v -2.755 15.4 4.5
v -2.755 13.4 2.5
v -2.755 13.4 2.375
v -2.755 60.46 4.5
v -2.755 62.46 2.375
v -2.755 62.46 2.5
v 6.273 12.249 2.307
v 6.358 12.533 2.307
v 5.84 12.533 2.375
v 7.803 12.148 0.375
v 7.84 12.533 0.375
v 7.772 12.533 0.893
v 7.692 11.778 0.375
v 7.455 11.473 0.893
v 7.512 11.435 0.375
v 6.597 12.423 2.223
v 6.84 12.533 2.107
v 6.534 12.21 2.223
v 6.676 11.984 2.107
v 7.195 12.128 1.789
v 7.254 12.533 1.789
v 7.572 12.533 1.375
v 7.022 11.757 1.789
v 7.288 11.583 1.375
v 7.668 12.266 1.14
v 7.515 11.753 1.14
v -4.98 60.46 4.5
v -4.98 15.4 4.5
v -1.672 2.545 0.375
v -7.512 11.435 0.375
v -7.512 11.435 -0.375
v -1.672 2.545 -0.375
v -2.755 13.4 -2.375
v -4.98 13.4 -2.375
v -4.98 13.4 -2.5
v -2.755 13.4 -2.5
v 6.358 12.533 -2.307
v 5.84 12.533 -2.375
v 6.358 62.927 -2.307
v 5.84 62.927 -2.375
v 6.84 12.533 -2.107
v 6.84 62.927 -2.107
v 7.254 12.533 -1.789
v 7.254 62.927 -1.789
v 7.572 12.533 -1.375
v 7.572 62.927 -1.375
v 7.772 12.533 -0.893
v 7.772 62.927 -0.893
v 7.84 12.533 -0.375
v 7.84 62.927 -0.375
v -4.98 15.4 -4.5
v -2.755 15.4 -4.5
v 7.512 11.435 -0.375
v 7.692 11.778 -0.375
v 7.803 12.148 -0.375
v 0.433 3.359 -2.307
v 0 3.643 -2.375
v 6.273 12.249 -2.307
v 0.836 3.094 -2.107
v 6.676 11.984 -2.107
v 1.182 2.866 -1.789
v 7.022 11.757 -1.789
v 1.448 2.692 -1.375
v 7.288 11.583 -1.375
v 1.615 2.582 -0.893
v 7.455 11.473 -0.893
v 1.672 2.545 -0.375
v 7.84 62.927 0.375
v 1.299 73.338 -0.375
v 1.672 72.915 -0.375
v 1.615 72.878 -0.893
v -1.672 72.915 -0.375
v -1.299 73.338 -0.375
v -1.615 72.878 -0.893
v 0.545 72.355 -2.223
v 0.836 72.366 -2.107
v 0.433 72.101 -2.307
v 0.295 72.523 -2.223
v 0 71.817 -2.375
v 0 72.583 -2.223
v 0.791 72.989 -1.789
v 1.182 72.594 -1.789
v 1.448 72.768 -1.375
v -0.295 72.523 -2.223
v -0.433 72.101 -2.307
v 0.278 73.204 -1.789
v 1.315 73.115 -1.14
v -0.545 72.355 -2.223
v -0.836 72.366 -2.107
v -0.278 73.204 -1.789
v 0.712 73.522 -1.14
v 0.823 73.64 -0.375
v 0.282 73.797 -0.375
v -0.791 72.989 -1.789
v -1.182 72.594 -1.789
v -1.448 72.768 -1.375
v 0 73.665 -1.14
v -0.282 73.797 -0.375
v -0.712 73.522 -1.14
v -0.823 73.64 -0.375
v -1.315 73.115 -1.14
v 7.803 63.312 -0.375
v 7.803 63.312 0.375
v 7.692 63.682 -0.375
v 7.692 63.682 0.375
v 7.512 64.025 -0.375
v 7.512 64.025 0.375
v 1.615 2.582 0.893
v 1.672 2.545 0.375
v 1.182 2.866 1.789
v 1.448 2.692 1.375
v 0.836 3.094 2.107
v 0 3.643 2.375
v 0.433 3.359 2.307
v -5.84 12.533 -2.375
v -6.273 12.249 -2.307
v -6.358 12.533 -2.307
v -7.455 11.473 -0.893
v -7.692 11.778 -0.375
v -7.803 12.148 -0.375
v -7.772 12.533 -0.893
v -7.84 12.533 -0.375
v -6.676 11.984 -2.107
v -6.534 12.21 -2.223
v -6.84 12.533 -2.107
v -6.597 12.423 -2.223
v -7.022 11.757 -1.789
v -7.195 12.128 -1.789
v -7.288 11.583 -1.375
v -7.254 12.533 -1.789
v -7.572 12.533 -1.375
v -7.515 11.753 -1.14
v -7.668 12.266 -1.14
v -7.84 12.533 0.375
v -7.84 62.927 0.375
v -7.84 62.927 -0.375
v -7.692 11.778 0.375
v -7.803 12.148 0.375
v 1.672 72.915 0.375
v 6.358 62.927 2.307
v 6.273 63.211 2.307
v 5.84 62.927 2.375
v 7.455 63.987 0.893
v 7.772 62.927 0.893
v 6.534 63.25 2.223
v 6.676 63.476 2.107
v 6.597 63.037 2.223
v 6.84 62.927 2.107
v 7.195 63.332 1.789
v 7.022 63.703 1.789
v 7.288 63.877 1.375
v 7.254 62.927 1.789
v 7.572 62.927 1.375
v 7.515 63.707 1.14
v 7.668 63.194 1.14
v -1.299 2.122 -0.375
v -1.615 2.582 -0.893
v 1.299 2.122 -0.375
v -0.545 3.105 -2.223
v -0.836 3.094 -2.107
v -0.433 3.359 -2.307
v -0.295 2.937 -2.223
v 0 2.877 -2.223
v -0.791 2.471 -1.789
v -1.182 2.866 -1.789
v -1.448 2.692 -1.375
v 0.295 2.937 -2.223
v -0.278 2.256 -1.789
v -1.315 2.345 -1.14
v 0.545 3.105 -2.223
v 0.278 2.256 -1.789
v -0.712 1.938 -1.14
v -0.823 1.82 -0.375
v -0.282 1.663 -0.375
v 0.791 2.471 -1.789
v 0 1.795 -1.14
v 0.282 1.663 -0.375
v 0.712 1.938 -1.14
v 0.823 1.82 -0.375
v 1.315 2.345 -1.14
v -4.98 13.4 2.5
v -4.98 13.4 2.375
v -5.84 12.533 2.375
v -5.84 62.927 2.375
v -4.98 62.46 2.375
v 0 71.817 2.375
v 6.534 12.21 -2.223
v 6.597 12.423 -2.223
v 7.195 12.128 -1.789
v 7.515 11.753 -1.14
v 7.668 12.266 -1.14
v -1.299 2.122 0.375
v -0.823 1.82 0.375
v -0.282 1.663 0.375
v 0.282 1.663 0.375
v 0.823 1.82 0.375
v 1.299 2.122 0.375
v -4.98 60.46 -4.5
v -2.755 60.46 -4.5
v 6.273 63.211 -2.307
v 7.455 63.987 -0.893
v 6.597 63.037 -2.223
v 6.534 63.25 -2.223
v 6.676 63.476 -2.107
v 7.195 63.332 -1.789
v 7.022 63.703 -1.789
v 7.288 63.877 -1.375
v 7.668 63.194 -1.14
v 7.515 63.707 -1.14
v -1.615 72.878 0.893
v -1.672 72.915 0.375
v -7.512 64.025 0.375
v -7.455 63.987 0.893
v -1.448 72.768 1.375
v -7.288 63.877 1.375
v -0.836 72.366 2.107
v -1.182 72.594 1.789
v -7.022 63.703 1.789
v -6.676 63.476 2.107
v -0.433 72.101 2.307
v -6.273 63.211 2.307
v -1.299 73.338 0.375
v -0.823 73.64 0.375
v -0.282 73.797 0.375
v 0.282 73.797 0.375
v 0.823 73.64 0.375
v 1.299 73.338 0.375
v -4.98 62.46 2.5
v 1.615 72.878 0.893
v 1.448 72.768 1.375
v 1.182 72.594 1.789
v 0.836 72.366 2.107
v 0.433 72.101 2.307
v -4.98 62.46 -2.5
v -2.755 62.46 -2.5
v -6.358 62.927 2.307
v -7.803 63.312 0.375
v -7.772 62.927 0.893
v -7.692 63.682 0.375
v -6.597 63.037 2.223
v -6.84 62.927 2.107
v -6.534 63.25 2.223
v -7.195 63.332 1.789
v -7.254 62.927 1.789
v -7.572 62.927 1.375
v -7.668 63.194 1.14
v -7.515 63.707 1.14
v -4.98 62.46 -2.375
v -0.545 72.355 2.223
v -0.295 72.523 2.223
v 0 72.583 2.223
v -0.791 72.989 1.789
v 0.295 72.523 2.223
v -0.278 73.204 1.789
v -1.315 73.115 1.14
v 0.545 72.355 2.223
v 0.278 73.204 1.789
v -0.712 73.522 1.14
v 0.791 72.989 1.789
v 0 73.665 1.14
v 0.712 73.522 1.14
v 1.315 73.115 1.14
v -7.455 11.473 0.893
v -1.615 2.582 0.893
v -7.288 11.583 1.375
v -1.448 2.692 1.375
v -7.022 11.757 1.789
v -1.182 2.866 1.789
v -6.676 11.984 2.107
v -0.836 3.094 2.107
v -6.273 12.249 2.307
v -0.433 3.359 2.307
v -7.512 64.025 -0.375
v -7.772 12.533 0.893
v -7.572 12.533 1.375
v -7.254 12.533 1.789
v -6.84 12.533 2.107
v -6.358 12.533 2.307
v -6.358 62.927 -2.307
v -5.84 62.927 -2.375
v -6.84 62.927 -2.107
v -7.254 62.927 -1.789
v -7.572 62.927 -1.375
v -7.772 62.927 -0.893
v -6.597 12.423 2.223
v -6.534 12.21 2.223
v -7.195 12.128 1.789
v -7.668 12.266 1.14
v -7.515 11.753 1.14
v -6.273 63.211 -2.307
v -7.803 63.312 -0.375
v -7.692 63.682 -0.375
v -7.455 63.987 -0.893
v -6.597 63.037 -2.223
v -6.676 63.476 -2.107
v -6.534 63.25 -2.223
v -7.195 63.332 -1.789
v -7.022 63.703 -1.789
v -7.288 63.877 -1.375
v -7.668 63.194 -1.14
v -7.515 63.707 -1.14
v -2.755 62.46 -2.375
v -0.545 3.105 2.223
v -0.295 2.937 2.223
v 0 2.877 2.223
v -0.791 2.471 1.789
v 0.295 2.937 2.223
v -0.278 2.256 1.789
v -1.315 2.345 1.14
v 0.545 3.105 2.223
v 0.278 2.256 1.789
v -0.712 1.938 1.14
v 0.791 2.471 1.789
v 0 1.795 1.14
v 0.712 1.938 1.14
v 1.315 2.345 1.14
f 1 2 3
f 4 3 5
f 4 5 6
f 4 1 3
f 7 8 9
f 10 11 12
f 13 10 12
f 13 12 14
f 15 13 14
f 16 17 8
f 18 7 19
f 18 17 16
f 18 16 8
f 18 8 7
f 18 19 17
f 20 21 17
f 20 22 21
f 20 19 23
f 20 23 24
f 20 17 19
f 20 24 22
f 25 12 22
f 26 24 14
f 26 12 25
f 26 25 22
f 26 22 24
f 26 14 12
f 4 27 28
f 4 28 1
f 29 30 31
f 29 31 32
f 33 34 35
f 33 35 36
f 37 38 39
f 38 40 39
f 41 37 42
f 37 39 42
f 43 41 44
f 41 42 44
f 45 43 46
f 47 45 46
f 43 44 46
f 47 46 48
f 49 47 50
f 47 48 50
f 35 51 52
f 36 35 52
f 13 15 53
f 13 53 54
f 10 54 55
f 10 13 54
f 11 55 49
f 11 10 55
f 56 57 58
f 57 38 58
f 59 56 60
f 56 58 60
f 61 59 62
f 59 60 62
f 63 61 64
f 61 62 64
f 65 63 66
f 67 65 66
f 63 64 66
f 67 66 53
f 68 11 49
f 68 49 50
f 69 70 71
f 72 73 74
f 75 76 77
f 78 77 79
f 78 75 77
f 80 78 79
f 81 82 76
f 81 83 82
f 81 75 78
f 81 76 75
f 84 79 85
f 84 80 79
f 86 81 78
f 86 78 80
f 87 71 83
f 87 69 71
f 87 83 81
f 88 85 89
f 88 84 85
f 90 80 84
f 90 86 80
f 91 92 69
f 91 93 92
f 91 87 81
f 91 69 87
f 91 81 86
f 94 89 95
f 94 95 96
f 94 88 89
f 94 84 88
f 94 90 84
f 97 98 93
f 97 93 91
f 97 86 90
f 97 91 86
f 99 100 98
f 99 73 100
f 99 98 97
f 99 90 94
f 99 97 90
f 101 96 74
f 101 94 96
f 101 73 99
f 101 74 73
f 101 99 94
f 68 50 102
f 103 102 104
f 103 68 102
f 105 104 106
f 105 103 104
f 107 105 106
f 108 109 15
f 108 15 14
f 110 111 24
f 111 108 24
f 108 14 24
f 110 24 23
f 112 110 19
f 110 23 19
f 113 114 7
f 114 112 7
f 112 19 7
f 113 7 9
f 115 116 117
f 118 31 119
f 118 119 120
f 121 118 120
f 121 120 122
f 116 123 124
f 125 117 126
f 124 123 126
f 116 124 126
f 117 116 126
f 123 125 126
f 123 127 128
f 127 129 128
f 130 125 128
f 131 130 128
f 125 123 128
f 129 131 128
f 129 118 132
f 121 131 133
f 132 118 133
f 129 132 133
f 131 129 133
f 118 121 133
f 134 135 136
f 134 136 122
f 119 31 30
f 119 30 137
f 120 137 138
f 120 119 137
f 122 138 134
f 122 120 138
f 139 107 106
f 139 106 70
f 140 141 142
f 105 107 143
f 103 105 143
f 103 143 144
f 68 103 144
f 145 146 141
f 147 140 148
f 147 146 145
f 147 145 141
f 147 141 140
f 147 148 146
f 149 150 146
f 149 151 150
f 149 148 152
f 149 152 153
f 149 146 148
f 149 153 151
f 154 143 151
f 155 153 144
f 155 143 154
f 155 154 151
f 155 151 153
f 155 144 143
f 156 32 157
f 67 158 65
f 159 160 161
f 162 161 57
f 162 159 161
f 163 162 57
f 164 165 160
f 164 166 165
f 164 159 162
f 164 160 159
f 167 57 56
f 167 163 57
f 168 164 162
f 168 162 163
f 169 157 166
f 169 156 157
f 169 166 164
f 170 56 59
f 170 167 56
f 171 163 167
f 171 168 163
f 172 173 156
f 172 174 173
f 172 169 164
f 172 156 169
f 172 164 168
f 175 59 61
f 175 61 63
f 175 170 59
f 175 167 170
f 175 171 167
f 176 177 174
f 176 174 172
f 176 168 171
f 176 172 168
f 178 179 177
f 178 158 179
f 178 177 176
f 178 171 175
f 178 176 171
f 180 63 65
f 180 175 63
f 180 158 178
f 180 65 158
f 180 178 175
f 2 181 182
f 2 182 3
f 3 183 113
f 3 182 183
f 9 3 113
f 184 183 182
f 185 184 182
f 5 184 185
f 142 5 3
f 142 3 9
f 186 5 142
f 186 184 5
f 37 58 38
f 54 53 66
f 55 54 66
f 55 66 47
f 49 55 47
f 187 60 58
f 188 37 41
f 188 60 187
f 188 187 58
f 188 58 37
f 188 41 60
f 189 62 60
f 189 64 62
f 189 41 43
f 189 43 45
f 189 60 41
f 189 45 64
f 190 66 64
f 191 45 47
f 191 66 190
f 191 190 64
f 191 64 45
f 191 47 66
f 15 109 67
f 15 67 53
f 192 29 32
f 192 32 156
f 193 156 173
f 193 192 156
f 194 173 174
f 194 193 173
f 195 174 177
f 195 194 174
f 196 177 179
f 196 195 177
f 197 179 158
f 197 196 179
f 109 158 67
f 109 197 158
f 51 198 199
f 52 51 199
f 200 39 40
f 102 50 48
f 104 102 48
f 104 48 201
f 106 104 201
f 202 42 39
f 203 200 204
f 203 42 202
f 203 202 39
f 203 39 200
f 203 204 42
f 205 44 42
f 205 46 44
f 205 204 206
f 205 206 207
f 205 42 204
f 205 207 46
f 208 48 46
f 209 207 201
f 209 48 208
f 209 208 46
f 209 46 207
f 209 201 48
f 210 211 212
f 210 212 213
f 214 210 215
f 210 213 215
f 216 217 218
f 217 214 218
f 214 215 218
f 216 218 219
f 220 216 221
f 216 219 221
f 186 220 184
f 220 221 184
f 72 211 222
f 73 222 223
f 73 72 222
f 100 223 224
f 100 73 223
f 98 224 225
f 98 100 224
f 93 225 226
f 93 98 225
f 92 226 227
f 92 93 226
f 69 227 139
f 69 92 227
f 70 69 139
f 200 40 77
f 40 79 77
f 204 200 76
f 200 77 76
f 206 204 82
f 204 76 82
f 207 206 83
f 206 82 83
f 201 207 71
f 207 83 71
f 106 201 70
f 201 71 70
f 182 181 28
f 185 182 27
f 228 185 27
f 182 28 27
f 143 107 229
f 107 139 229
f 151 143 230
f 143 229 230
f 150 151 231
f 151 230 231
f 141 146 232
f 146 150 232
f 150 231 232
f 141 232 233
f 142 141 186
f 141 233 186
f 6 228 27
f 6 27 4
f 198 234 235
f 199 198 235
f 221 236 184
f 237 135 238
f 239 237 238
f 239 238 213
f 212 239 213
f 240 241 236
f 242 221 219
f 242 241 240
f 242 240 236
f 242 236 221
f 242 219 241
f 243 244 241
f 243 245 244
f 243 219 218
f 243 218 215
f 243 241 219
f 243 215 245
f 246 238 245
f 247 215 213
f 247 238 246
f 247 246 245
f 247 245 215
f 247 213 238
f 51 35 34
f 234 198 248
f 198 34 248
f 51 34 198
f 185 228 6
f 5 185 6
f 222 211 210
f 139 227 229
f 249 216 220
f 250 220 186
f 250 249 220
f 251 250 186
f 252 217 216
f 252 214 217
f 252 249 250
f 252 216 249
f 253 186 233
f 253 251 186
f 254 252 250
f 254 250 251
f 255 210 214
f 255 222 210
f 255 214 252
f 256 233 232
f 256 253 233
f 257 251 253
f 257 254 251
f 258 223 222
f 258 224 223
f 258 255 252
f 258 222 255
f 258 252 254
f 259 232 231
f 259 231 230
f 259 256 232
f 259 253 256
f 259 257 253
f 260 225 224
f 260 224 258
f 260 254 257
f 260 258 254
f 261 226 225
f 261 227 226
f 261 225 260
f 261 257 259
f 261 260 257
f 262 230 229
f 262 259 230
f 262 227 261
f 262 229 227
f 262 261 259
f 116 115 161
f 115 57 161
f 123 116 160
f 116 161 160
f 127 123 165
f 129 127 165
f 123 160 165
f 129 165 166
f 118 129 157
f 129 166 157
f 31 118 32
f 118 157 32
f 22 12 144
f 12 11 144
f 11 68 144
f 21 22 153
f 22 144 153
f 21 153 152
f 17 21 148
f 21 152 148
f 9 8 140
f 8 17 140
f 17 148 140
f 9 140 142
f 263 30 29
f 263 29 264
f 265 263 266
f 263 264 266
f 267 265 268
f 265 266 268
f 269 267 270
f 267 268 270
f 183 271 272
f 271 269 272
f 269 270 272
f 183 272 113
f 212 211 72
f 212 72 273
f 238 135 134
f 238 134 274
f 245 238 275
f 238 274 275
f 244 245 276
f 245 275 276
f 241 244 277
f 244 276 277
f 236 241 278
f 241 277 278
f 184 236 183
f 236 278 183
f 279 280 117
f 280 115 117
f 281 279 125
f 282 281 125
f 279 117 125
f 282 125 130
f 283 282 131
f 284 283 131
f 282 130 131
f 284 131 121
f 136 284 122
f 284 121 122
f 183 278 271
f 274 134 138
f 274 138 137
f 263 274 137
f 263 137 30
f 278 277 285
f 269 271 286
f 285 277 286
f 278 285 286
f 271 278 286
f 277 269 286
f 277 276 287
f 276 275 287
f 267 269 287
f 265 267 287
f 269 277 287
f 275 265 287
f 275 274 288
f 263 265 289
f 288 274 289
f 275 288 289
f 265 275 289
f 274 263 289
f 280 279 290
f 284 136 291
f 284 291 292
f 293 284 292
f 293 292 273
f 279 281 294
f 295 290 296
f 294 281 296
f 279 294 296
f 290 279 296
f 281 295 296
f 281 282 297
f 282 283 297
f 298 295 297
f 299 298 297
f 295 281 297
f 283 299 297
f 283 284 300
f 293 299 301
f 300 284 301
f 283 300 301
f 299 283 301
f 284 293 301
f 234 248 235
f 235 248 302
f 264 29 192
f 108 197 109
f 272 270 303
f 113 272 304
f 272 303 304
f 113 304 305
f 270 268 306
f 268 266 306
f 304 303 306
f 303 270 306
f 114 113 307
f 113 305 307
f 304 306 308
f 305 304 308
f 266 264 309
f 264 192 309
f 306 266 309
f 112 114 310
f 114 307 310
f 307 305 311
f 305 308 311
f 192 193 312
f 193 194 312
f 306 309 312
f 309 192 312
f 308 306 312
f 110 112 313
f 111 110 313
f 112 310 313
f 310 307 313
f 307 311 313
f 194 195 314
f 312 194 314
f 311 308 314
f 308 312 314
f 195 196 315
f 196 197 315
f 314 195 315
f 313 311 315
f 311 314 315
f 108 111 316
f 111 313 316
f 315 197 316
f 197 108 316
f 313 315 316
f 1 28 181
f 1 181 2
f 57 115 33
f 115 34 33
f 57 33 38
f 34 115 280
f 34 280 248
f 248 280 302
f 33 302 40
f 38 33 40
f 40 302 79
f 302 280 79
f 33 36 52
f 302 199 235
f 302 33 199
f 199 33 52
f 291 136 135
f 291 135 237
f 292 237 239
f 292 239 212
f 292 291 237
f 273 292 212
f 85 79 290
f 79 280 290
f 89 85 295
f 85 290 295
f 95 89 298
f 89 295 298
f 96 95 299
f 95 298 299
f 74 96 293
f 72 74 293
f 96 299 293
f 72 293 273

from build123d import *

# Parameters (mm, degrees)
F0_W     = 2.225
F0_H     = 49.06
F1_DEPTH = 4.5
F2_DEPTH = 2.375
F3_R     = 2
F4_SIZE  = 2


with BuildPart() as f1:
    # F0 (on Top) → F1 (new body, symmetric)
    with BuildSketch(Plane.XY):
        with Locations((-3.8675, 37.93)):
            Rectangle(F0_W, F0_H)
    extrude(amount=F1_DEPTH, both=True)

    # F0 (on Top) → F2 (join, symmetric)
    with BuildSketch(Plane.XY):
        Polygon((-7.84, 11.935359), (0, 0), (7.84, 11.935359), (7.84, 63.524641), (0, 75.46), (-7.84, 63.524641), align=None)
        with Locations((-3.8675, 37.93)):
            Rectangle(F0_W, F0_H, mode=Mode.SUBTRACT)
    extrude(amount=F2_DEPTH, both=True)

    # F3
    f3_edges = [f1.edges().sort_by_distance(p)[0] for p in [
        (-7.84, 37.73, 2.375),
        (-3.92, 69.49232, 2.375),
        (3.92, 69.49232, 2.375),
        (7.84, 37.73, 2.375),
        (-3.92, 5.96768, 2.375),
        (3.92, 5.96768, 2.375),
        (-3.92, 5.96768, -2.375),
        (-7.84, 37.73, -2.375),
        (3.92, 5.96768, -2.375),
        (7.84, 37.73, -2.375),
        (3.92, 69.49232, -2.375),
        (-3.92, 69.49232, -2.375),
        (0, 75.46, 0),
        (-7.84, 63.524641, 0),
        (7.84, 63.524641, 0),
        (7.84, 11.935359, 0),
        (-7.84, 11.935359, 0),
        (0, 0, 0),
    ]]
    fillet(f3_edges, radius=F3_R)

    # F4
    f4_edges = [f1.edges().sort_by_distance(p)[0] for p in [
        (-3.8675, 62.46, 4.5),
        (-3.8675, 62.46, -4.5),
        (-3.8675, 13.4, 4.5),
        (-3.8675, 13.4, -4.5),
    ]]
    chamfer(f4_edges, length=F4_SIZE)


solid = f1.part
